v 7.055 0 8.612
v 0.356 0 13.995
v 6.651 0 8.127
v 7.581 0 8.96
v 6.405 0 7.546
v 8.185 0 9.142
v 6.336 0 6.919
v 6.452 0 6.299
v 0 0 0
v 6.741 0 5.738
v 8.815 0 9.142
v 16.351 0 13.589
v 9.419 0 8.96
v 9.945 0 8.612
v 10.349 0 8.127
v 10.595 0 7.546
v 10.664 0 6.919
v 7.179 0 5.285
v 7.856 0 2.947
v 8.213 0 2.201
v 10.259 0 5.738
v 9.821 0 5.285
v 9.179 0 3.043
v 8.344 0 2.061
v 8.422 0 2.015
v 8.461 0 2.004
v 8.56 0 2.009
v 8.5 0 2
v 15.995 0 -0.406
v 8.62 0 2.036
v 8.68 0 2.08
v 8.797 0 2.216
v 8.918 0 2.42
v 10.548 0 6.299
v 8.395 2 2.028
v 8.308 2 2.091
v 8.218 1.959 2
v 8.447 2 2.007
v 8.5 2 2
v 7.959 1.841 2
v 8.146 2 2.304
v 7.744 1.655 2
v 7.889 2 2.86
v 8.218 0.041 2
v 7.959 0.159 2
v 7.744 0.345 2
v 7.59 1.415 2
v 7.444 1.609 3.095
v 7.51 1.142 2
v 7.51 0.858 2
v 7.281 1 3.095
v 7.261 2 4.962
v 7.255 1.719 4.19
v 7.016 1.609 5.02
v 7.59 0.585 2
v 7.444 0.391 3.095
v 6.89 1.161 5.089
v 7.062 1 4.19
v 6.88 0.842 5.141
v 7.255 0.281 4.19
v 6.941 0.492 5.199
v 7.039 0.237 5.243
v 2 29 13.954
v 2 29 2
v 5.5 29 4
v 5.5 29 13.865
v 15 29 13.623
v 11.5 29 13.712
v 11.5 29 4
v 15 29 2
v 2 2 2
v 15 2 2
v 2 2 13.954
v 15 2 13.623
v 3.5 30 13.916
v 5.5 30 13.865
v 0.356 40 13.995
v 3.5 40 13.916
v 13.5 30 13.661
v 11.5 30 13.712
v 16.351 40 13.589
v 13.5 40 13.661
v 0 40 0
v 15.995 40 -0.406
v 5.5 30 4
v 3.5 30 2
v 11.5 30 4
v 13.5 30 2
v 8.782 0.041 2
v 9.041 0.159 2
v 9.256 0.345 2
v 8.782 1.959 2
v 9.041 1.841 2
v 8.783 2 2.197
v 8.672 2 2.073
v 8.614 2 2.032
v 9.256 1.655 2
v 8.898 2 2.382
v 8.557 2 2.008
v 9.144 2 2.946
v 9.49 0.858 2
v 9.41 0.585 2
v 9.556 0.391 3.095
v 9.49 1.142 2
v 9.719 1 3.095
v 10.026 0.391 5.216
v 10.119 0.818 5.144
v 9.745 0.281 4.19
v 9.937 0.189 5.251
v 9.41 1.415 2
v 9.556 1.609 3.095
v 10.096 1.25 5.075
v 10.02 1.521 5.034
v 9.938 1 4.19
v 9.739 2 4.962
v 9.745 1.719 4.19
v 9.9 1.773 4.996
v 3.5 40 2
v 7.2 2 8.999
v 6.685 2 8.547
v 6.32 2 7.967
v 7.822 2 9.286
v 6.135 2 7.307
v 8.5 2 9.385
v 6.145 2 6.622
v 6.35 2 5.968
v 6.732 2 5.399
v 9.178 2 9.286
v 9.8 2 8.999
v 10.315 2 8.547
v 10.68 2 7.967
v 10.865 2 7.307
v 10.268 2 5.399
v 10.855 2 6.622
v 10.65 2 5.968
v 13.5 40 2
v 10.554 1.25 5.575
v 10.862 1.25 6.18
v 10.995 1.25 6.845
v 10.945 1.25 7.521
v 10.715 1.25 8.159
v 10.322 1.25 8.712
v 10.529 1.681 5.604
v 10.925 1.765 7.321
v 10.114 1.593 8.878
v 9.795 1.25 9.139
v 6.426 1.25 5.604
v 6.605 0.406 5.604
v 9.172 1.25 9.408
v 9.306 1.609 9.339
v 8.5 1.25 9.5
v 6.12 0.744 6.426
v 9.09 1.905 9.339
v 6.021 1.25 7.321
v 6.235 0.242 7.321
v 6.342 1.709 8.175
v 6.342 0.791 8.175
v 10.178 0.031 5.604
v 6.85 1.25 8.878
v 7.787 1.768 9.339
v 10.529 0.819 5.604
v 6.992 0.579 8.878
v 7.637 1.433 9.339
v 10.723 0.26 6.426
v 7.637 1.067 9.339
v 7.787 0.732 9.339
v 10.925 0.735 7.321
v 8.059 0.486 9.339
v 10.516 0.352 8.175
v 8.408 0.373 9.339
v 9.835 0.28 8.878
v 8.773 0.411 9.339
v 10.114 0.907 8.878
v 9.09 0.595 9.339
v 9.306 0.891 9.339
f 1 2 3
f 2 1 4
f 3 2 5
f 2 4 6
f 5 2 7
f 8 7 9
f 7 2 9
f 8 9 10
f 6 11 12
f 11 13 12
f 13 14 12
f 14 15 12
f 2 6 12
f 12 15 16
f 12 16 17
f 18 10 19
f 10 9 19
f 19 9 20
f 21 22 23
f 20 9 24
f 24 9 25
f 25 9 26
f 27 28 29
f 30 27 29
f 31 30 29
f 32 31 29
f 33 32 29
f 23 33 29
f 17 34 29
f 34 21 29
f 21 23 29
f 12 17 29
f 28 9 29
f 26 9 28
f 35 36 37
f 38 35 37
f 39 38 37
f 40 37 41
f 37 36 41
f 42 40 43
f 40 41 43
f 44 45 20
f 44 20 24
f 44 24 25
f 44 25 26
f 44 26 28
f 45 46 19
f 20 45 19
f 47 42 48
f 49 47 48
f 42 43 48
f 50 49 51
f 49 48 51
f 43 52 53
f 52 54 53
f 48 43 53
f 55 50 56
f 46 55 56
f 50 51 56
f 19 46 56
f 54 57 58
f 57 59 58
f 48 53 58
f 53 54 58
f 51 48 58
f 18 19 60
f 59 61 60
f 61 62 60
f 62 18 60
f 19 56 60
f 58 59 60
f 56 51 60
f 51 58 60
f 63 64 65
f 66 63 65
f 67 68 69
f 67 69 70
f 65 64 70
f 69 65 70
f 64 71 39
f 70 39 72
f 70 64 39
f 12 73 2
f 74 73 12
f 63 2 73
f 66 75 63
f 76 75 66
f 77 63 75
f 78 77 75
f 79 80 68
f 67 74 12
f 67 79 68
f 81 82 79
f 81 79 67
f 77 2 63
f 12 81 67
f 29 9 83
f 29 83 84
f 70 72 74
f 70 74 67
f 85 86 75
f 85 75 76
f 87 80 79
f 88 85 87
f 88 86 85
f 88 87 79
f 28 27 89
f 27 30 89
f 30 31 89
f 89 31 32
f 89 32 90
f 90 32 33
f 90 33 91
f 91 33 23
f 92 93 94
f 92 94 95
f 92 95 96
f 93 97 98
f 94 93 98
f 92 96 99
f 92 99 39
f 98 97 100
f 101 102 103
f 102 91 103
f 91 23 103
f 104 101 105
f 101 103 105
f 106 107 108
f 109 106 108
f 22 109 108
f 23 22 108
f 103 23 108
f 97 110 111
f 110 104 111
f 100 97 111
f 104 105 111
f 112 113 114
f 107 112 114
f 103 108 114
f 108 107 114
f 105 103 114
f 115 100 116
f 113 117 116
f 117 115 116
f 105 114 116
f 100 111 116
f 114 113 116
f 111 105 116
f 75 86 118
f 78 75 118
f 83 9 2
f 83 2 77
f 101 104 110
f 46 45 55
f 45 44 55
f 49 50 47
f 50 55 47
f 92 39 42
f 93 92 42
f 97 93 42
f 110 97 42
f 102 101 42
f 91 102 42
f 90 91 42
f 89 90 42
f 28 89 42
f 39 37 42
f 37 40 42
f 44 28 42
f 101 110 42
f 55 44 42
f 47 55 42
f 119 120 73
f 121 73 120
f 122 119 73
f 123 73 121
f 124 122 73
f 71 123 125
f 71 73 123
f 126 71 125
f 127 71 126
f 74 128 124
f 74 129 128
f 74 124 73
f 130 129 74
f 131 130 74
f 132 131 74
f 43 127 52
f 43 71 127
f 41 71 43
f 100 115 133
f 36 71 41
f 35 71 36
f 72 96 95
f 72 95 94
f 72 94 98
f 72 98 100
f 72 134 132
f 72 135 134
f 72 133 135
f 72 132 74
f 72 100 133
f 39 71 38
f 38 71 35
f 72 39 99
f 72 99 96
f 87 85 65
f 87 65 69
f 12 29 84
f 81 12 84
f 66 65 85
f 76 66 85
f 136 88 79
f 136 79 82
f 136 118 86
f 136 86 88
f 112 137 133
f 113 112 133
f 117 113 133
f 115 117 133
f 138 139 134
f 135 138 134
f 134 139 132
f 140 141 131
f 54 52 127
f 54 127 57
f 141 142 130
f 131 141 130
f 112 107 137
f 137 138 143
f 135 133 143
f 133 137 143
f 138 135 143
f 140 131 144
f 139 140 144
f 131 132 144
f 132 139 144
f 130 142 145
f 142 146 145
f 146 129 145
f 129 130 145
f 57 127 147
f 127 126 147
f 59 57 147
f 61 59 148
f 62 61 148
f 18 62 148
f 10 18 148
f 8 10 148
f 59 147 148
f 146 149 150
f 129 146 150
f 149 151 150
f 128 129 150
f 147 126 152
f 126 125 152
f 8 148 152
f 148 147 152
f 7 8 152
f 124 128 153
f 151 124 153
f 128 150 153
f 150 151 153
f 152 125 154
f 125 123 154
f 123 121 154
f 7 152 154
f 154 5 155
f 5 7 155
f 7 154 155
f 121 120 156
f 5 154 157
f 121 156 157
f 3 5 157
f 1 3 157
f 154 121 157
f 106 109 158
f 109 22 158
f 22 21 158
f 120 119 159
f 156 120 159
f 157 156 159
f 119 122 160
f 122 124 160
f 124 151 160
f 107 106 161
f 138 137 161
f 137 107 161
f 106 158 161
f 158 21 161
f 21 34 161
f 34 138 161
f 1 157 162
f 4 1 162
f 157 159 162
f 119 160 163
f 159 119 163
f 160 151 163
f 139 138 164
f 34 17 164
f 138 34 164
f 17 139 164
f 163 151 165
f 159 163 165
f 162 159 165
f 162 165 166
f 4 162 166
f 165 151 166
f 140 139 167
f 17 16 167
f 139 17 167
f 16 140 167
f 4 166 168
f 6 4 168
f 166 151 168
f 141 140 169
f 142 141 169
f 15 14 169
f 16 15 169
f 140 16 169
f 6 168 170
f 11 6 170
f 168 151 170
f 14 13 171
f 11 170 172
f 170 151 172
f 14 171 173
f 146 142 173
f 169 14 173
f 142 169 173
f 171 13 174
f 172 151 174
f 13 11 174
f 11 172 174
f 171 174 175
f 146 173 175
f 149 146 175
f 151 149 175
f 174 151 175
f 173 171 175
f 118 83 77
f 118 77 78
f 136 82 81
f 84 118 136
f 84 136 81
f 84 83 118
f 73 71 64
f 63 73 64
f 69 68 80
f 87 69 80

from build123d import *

# Parameters (mm, degrees)
BOX003_W        = 6
BOX003_H        = 4
BOX003_DEPTH    = 15
BOX002_W        = 10
BOX002_H        = 10
BOX002_DEPTH    = 15
BOX001_W        = 13
BOX001_H        = 27
BOX001_DEPTH    = 12
BOX_W           = 16
BOX_H           = 40
BOX_DEPTH       = 14
BOX_PITCH_ANGLE = 1.455764


with BuildPart() as cone:
    # Cone → Cone (revolve)
    with BuildSketch(Plane(origin=(8.5, 1, 2), x_dir=(1, 0, 0), z_dir=(0, -1, 0))):
        Polygon((0, 0), (1, 0), (2, 5), (0, 5), align=None)
    revolve(axis=Axis((8.5, 1, 2), (0, 0, 1)))


with BuildPart() as pinhole:
    # Sphere → Sphere (revolve)
    with BuildSketch(Plane(origin=(8.5, 1.25, 7), x_dir=(1, 0, 0), z_dir=(0, -1, 0))):
        with BuildLine():
            ThreePointArc((0, -2.5), (2.5, 0), (0, 2.5))
            Line((0, 2.5), (0, -2.5))
        make_face()
    revolve(axis=Axis((8.5, 1.25, 7), (0, 0, 1)))


with BuildPart() as neck:
    # Box003 → Box003 (new body)
    with BuildSketch(Plane(origin=(5.5, 28, 4), x_dir=(1, 0, 0), z_dir=(0, 0, 1))):
        with Locations((3, 2)):
            Rectangle(BOX003_W, BOX003_H)
    extrude(amount=BOX003_DEPTH)


with BuildPart() as pullbay:
    # Box002 → Box002 (new body)
    with BuildSketch(Plane(origin=(3.5, 30, 2), x_dir=(1, 0, 0), z_dir=(0, 0, 1))):
        with Locations((5, 5)):
            Rectangle(BOX002_W, BOX002_H)
    extrude(amount=BOX002_DEPTH)


with BuildPart() as solenoidbay:
    # Box001 → Box001 (new body)
    with BuildSketch(Plane(origin=(2, 2, 2), x_dir=(1, 0, 0), z_dir=(0, 0, 1))):
        with Locations((6.5, 13.5)):
            Rectangle(BOX001_W, BOX001_H)
    extrude(amount=BOX001_DEPTH)


with BuildPart() as cut004:
    # Box → Box (new body)
    with BuildSketch(Plane.XY):
        with Locations((8, 20)):
            Rectangle(BOX_W, BOX_H)
    extrude(amount=BOX_DEPTH)


with BuildPart() as cut004_1:
    # Box pitch: moved
    add(cut004.part.rotate(Axis((0, 0, 0), (0, 1, 0)), BOX_PITCH_ANGLE))


with BuildPart() as cut004_2:
    # Box placement: moved
    add(cut004_1.part)

    # Cut: cut solenoidBay
    add(solenoidbay.part, mode=Mode.SUBTRACT)

    # Cut001: cut pullBay
    add(pullbay.part, mode=Mode.SUBTRACT)

    # Cut002: cut neck
    add(neck.part, mode=Mode.SUBTRACT)

    # Cut003: cut pinhole
    add(pinhole.part, mode=Mode.SUBTRACT)

    # Cut004: cut Cone
    add(cone.part, mode=Mode.SUBTRACT)


solid = cut004_2.part
